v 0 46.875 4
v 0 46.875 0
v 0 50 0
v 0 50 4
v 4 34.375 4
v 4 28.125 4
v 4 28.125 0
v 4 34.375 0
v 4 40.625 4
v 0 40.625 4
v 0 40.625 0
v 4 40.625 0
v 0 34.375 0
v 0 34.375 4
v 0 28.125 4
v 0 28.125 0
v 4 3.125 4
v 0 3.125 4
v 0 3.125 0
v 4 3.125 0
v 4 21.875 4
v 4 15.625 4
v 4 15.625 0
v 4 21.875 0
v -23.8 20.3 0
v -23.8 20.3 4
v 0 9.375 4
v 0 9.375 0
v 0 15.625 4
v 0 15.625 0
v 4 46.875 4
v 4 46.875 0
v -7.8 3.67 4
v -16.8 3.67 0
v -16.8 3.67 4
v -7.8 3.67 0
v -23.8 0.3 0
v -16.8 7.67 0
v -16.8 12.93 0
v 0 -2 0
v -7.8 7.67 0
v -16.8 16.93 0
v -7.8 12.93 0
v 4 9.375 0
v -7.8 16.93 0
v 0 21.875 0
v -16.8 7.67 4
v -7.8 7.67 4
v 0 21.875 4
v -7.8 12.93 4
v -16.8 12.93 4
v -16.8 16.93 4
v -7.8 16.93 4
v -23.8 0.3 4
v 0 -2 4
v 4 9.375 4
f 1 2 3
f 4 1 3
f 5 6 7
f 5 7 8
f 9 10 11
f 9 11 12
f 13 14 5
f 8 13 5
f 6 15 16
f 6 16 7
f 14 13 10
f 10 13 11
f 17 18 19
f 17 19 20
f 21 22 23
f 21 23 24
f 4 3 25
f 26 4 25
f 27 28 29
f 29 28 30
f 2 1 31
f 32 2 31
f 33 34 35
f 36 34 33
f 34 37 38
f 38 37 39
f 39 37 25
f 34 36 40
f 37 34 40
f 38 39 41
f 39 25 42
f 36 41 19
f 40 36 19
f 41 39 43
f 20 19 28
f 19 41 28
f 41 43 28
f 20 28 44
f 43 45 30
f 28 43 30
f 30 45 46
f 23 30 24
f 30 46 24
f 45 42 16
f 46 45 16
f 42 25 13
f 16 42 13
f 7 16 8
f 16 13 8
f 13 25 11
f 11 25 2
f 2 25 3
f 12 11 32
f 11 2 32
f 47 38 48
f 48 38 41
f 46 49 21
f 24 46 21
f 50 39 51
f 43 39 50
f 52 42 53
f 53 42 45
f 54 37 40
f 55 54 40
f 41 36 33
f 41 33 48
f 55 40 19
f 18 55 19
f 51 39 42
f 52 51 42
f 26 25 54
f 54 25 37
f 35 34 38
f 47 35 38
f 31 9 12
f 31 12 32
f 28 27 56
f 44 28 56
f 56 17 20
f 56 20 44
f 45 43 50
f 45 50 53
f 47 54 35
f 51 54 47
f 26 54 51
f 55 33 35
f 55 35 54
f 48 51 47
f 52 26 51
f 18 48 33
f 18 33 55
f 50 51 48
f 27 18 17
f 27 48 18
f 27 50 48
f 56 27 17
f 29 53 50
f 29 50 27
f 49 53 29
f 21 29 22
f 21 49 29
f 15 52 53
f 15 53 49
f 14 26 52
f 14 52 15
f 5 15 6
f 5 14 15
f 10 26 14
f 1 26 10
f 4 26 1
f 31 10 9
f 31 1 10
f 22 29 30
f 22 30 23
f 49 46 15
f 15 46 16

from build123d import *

# Parameters (mm, degrees)
SCHIZZO1_W                   = 9
SCHIZZO1_H                   = 4
ESTRUSIONE_ESTRUSIONE1_DEPTH = 4
SCHIZZO2_W                   = 4
SCHIZZO2_H                   = 6.25
ESTRUSIONE_ESTRUSIONE2_DEPTH = 4
RIPETIZIONE_A_L1_COUNT       = 4
RIPETIZIONE_A_L1_PITCH       = 12.5


with BuildPart() as part:
    # Schizzo1 → Estrusione-Estrusione1 (new body)
    with BuildSketch(Plane.XY):
        Polygon((0, 50), (-23.8, 20.3), (-23.8, 0.3), (0, -2), align=None)
        with Locations((-12.3, 5.67)):
            Rectangle(SCHIZZO1_W, SCHIZZO1_H, mode=Mode.SUBTRACT)
        with Locations((-12.3, 14.93)):
            Rectangle(SCHIZZO1_W, SCHIZZO1_H, mode=Mode.SUBTRACT)
    extrude(amount=ESTRUSIONE_ESTRUSIONE1_DEPTH)

    # Schizzo2 → Estrusione-Estrusione2 (add)
    with BuildSketch(Plane.XY.offset(4)):
        with Locations((2, 43.75)):
            Rectangle(SCHIZZO2_W, SCHIZZO2_H)
    estrusione_estrusione2 = extrude(amount=-ESTRUSIONE_ESTRUSIONE2_DEPTH)

    # Ripetizione a L1: Estrusione-Estrusione2 ×4
    with Locations(*[(0, -i * RIPETIZIONE_A_L1_PITCH, 0) for i in range(1, RIPETIZIONE_A_L1_COUNT)]):
        add(estrusione_estrusione2)


solid = part.part
